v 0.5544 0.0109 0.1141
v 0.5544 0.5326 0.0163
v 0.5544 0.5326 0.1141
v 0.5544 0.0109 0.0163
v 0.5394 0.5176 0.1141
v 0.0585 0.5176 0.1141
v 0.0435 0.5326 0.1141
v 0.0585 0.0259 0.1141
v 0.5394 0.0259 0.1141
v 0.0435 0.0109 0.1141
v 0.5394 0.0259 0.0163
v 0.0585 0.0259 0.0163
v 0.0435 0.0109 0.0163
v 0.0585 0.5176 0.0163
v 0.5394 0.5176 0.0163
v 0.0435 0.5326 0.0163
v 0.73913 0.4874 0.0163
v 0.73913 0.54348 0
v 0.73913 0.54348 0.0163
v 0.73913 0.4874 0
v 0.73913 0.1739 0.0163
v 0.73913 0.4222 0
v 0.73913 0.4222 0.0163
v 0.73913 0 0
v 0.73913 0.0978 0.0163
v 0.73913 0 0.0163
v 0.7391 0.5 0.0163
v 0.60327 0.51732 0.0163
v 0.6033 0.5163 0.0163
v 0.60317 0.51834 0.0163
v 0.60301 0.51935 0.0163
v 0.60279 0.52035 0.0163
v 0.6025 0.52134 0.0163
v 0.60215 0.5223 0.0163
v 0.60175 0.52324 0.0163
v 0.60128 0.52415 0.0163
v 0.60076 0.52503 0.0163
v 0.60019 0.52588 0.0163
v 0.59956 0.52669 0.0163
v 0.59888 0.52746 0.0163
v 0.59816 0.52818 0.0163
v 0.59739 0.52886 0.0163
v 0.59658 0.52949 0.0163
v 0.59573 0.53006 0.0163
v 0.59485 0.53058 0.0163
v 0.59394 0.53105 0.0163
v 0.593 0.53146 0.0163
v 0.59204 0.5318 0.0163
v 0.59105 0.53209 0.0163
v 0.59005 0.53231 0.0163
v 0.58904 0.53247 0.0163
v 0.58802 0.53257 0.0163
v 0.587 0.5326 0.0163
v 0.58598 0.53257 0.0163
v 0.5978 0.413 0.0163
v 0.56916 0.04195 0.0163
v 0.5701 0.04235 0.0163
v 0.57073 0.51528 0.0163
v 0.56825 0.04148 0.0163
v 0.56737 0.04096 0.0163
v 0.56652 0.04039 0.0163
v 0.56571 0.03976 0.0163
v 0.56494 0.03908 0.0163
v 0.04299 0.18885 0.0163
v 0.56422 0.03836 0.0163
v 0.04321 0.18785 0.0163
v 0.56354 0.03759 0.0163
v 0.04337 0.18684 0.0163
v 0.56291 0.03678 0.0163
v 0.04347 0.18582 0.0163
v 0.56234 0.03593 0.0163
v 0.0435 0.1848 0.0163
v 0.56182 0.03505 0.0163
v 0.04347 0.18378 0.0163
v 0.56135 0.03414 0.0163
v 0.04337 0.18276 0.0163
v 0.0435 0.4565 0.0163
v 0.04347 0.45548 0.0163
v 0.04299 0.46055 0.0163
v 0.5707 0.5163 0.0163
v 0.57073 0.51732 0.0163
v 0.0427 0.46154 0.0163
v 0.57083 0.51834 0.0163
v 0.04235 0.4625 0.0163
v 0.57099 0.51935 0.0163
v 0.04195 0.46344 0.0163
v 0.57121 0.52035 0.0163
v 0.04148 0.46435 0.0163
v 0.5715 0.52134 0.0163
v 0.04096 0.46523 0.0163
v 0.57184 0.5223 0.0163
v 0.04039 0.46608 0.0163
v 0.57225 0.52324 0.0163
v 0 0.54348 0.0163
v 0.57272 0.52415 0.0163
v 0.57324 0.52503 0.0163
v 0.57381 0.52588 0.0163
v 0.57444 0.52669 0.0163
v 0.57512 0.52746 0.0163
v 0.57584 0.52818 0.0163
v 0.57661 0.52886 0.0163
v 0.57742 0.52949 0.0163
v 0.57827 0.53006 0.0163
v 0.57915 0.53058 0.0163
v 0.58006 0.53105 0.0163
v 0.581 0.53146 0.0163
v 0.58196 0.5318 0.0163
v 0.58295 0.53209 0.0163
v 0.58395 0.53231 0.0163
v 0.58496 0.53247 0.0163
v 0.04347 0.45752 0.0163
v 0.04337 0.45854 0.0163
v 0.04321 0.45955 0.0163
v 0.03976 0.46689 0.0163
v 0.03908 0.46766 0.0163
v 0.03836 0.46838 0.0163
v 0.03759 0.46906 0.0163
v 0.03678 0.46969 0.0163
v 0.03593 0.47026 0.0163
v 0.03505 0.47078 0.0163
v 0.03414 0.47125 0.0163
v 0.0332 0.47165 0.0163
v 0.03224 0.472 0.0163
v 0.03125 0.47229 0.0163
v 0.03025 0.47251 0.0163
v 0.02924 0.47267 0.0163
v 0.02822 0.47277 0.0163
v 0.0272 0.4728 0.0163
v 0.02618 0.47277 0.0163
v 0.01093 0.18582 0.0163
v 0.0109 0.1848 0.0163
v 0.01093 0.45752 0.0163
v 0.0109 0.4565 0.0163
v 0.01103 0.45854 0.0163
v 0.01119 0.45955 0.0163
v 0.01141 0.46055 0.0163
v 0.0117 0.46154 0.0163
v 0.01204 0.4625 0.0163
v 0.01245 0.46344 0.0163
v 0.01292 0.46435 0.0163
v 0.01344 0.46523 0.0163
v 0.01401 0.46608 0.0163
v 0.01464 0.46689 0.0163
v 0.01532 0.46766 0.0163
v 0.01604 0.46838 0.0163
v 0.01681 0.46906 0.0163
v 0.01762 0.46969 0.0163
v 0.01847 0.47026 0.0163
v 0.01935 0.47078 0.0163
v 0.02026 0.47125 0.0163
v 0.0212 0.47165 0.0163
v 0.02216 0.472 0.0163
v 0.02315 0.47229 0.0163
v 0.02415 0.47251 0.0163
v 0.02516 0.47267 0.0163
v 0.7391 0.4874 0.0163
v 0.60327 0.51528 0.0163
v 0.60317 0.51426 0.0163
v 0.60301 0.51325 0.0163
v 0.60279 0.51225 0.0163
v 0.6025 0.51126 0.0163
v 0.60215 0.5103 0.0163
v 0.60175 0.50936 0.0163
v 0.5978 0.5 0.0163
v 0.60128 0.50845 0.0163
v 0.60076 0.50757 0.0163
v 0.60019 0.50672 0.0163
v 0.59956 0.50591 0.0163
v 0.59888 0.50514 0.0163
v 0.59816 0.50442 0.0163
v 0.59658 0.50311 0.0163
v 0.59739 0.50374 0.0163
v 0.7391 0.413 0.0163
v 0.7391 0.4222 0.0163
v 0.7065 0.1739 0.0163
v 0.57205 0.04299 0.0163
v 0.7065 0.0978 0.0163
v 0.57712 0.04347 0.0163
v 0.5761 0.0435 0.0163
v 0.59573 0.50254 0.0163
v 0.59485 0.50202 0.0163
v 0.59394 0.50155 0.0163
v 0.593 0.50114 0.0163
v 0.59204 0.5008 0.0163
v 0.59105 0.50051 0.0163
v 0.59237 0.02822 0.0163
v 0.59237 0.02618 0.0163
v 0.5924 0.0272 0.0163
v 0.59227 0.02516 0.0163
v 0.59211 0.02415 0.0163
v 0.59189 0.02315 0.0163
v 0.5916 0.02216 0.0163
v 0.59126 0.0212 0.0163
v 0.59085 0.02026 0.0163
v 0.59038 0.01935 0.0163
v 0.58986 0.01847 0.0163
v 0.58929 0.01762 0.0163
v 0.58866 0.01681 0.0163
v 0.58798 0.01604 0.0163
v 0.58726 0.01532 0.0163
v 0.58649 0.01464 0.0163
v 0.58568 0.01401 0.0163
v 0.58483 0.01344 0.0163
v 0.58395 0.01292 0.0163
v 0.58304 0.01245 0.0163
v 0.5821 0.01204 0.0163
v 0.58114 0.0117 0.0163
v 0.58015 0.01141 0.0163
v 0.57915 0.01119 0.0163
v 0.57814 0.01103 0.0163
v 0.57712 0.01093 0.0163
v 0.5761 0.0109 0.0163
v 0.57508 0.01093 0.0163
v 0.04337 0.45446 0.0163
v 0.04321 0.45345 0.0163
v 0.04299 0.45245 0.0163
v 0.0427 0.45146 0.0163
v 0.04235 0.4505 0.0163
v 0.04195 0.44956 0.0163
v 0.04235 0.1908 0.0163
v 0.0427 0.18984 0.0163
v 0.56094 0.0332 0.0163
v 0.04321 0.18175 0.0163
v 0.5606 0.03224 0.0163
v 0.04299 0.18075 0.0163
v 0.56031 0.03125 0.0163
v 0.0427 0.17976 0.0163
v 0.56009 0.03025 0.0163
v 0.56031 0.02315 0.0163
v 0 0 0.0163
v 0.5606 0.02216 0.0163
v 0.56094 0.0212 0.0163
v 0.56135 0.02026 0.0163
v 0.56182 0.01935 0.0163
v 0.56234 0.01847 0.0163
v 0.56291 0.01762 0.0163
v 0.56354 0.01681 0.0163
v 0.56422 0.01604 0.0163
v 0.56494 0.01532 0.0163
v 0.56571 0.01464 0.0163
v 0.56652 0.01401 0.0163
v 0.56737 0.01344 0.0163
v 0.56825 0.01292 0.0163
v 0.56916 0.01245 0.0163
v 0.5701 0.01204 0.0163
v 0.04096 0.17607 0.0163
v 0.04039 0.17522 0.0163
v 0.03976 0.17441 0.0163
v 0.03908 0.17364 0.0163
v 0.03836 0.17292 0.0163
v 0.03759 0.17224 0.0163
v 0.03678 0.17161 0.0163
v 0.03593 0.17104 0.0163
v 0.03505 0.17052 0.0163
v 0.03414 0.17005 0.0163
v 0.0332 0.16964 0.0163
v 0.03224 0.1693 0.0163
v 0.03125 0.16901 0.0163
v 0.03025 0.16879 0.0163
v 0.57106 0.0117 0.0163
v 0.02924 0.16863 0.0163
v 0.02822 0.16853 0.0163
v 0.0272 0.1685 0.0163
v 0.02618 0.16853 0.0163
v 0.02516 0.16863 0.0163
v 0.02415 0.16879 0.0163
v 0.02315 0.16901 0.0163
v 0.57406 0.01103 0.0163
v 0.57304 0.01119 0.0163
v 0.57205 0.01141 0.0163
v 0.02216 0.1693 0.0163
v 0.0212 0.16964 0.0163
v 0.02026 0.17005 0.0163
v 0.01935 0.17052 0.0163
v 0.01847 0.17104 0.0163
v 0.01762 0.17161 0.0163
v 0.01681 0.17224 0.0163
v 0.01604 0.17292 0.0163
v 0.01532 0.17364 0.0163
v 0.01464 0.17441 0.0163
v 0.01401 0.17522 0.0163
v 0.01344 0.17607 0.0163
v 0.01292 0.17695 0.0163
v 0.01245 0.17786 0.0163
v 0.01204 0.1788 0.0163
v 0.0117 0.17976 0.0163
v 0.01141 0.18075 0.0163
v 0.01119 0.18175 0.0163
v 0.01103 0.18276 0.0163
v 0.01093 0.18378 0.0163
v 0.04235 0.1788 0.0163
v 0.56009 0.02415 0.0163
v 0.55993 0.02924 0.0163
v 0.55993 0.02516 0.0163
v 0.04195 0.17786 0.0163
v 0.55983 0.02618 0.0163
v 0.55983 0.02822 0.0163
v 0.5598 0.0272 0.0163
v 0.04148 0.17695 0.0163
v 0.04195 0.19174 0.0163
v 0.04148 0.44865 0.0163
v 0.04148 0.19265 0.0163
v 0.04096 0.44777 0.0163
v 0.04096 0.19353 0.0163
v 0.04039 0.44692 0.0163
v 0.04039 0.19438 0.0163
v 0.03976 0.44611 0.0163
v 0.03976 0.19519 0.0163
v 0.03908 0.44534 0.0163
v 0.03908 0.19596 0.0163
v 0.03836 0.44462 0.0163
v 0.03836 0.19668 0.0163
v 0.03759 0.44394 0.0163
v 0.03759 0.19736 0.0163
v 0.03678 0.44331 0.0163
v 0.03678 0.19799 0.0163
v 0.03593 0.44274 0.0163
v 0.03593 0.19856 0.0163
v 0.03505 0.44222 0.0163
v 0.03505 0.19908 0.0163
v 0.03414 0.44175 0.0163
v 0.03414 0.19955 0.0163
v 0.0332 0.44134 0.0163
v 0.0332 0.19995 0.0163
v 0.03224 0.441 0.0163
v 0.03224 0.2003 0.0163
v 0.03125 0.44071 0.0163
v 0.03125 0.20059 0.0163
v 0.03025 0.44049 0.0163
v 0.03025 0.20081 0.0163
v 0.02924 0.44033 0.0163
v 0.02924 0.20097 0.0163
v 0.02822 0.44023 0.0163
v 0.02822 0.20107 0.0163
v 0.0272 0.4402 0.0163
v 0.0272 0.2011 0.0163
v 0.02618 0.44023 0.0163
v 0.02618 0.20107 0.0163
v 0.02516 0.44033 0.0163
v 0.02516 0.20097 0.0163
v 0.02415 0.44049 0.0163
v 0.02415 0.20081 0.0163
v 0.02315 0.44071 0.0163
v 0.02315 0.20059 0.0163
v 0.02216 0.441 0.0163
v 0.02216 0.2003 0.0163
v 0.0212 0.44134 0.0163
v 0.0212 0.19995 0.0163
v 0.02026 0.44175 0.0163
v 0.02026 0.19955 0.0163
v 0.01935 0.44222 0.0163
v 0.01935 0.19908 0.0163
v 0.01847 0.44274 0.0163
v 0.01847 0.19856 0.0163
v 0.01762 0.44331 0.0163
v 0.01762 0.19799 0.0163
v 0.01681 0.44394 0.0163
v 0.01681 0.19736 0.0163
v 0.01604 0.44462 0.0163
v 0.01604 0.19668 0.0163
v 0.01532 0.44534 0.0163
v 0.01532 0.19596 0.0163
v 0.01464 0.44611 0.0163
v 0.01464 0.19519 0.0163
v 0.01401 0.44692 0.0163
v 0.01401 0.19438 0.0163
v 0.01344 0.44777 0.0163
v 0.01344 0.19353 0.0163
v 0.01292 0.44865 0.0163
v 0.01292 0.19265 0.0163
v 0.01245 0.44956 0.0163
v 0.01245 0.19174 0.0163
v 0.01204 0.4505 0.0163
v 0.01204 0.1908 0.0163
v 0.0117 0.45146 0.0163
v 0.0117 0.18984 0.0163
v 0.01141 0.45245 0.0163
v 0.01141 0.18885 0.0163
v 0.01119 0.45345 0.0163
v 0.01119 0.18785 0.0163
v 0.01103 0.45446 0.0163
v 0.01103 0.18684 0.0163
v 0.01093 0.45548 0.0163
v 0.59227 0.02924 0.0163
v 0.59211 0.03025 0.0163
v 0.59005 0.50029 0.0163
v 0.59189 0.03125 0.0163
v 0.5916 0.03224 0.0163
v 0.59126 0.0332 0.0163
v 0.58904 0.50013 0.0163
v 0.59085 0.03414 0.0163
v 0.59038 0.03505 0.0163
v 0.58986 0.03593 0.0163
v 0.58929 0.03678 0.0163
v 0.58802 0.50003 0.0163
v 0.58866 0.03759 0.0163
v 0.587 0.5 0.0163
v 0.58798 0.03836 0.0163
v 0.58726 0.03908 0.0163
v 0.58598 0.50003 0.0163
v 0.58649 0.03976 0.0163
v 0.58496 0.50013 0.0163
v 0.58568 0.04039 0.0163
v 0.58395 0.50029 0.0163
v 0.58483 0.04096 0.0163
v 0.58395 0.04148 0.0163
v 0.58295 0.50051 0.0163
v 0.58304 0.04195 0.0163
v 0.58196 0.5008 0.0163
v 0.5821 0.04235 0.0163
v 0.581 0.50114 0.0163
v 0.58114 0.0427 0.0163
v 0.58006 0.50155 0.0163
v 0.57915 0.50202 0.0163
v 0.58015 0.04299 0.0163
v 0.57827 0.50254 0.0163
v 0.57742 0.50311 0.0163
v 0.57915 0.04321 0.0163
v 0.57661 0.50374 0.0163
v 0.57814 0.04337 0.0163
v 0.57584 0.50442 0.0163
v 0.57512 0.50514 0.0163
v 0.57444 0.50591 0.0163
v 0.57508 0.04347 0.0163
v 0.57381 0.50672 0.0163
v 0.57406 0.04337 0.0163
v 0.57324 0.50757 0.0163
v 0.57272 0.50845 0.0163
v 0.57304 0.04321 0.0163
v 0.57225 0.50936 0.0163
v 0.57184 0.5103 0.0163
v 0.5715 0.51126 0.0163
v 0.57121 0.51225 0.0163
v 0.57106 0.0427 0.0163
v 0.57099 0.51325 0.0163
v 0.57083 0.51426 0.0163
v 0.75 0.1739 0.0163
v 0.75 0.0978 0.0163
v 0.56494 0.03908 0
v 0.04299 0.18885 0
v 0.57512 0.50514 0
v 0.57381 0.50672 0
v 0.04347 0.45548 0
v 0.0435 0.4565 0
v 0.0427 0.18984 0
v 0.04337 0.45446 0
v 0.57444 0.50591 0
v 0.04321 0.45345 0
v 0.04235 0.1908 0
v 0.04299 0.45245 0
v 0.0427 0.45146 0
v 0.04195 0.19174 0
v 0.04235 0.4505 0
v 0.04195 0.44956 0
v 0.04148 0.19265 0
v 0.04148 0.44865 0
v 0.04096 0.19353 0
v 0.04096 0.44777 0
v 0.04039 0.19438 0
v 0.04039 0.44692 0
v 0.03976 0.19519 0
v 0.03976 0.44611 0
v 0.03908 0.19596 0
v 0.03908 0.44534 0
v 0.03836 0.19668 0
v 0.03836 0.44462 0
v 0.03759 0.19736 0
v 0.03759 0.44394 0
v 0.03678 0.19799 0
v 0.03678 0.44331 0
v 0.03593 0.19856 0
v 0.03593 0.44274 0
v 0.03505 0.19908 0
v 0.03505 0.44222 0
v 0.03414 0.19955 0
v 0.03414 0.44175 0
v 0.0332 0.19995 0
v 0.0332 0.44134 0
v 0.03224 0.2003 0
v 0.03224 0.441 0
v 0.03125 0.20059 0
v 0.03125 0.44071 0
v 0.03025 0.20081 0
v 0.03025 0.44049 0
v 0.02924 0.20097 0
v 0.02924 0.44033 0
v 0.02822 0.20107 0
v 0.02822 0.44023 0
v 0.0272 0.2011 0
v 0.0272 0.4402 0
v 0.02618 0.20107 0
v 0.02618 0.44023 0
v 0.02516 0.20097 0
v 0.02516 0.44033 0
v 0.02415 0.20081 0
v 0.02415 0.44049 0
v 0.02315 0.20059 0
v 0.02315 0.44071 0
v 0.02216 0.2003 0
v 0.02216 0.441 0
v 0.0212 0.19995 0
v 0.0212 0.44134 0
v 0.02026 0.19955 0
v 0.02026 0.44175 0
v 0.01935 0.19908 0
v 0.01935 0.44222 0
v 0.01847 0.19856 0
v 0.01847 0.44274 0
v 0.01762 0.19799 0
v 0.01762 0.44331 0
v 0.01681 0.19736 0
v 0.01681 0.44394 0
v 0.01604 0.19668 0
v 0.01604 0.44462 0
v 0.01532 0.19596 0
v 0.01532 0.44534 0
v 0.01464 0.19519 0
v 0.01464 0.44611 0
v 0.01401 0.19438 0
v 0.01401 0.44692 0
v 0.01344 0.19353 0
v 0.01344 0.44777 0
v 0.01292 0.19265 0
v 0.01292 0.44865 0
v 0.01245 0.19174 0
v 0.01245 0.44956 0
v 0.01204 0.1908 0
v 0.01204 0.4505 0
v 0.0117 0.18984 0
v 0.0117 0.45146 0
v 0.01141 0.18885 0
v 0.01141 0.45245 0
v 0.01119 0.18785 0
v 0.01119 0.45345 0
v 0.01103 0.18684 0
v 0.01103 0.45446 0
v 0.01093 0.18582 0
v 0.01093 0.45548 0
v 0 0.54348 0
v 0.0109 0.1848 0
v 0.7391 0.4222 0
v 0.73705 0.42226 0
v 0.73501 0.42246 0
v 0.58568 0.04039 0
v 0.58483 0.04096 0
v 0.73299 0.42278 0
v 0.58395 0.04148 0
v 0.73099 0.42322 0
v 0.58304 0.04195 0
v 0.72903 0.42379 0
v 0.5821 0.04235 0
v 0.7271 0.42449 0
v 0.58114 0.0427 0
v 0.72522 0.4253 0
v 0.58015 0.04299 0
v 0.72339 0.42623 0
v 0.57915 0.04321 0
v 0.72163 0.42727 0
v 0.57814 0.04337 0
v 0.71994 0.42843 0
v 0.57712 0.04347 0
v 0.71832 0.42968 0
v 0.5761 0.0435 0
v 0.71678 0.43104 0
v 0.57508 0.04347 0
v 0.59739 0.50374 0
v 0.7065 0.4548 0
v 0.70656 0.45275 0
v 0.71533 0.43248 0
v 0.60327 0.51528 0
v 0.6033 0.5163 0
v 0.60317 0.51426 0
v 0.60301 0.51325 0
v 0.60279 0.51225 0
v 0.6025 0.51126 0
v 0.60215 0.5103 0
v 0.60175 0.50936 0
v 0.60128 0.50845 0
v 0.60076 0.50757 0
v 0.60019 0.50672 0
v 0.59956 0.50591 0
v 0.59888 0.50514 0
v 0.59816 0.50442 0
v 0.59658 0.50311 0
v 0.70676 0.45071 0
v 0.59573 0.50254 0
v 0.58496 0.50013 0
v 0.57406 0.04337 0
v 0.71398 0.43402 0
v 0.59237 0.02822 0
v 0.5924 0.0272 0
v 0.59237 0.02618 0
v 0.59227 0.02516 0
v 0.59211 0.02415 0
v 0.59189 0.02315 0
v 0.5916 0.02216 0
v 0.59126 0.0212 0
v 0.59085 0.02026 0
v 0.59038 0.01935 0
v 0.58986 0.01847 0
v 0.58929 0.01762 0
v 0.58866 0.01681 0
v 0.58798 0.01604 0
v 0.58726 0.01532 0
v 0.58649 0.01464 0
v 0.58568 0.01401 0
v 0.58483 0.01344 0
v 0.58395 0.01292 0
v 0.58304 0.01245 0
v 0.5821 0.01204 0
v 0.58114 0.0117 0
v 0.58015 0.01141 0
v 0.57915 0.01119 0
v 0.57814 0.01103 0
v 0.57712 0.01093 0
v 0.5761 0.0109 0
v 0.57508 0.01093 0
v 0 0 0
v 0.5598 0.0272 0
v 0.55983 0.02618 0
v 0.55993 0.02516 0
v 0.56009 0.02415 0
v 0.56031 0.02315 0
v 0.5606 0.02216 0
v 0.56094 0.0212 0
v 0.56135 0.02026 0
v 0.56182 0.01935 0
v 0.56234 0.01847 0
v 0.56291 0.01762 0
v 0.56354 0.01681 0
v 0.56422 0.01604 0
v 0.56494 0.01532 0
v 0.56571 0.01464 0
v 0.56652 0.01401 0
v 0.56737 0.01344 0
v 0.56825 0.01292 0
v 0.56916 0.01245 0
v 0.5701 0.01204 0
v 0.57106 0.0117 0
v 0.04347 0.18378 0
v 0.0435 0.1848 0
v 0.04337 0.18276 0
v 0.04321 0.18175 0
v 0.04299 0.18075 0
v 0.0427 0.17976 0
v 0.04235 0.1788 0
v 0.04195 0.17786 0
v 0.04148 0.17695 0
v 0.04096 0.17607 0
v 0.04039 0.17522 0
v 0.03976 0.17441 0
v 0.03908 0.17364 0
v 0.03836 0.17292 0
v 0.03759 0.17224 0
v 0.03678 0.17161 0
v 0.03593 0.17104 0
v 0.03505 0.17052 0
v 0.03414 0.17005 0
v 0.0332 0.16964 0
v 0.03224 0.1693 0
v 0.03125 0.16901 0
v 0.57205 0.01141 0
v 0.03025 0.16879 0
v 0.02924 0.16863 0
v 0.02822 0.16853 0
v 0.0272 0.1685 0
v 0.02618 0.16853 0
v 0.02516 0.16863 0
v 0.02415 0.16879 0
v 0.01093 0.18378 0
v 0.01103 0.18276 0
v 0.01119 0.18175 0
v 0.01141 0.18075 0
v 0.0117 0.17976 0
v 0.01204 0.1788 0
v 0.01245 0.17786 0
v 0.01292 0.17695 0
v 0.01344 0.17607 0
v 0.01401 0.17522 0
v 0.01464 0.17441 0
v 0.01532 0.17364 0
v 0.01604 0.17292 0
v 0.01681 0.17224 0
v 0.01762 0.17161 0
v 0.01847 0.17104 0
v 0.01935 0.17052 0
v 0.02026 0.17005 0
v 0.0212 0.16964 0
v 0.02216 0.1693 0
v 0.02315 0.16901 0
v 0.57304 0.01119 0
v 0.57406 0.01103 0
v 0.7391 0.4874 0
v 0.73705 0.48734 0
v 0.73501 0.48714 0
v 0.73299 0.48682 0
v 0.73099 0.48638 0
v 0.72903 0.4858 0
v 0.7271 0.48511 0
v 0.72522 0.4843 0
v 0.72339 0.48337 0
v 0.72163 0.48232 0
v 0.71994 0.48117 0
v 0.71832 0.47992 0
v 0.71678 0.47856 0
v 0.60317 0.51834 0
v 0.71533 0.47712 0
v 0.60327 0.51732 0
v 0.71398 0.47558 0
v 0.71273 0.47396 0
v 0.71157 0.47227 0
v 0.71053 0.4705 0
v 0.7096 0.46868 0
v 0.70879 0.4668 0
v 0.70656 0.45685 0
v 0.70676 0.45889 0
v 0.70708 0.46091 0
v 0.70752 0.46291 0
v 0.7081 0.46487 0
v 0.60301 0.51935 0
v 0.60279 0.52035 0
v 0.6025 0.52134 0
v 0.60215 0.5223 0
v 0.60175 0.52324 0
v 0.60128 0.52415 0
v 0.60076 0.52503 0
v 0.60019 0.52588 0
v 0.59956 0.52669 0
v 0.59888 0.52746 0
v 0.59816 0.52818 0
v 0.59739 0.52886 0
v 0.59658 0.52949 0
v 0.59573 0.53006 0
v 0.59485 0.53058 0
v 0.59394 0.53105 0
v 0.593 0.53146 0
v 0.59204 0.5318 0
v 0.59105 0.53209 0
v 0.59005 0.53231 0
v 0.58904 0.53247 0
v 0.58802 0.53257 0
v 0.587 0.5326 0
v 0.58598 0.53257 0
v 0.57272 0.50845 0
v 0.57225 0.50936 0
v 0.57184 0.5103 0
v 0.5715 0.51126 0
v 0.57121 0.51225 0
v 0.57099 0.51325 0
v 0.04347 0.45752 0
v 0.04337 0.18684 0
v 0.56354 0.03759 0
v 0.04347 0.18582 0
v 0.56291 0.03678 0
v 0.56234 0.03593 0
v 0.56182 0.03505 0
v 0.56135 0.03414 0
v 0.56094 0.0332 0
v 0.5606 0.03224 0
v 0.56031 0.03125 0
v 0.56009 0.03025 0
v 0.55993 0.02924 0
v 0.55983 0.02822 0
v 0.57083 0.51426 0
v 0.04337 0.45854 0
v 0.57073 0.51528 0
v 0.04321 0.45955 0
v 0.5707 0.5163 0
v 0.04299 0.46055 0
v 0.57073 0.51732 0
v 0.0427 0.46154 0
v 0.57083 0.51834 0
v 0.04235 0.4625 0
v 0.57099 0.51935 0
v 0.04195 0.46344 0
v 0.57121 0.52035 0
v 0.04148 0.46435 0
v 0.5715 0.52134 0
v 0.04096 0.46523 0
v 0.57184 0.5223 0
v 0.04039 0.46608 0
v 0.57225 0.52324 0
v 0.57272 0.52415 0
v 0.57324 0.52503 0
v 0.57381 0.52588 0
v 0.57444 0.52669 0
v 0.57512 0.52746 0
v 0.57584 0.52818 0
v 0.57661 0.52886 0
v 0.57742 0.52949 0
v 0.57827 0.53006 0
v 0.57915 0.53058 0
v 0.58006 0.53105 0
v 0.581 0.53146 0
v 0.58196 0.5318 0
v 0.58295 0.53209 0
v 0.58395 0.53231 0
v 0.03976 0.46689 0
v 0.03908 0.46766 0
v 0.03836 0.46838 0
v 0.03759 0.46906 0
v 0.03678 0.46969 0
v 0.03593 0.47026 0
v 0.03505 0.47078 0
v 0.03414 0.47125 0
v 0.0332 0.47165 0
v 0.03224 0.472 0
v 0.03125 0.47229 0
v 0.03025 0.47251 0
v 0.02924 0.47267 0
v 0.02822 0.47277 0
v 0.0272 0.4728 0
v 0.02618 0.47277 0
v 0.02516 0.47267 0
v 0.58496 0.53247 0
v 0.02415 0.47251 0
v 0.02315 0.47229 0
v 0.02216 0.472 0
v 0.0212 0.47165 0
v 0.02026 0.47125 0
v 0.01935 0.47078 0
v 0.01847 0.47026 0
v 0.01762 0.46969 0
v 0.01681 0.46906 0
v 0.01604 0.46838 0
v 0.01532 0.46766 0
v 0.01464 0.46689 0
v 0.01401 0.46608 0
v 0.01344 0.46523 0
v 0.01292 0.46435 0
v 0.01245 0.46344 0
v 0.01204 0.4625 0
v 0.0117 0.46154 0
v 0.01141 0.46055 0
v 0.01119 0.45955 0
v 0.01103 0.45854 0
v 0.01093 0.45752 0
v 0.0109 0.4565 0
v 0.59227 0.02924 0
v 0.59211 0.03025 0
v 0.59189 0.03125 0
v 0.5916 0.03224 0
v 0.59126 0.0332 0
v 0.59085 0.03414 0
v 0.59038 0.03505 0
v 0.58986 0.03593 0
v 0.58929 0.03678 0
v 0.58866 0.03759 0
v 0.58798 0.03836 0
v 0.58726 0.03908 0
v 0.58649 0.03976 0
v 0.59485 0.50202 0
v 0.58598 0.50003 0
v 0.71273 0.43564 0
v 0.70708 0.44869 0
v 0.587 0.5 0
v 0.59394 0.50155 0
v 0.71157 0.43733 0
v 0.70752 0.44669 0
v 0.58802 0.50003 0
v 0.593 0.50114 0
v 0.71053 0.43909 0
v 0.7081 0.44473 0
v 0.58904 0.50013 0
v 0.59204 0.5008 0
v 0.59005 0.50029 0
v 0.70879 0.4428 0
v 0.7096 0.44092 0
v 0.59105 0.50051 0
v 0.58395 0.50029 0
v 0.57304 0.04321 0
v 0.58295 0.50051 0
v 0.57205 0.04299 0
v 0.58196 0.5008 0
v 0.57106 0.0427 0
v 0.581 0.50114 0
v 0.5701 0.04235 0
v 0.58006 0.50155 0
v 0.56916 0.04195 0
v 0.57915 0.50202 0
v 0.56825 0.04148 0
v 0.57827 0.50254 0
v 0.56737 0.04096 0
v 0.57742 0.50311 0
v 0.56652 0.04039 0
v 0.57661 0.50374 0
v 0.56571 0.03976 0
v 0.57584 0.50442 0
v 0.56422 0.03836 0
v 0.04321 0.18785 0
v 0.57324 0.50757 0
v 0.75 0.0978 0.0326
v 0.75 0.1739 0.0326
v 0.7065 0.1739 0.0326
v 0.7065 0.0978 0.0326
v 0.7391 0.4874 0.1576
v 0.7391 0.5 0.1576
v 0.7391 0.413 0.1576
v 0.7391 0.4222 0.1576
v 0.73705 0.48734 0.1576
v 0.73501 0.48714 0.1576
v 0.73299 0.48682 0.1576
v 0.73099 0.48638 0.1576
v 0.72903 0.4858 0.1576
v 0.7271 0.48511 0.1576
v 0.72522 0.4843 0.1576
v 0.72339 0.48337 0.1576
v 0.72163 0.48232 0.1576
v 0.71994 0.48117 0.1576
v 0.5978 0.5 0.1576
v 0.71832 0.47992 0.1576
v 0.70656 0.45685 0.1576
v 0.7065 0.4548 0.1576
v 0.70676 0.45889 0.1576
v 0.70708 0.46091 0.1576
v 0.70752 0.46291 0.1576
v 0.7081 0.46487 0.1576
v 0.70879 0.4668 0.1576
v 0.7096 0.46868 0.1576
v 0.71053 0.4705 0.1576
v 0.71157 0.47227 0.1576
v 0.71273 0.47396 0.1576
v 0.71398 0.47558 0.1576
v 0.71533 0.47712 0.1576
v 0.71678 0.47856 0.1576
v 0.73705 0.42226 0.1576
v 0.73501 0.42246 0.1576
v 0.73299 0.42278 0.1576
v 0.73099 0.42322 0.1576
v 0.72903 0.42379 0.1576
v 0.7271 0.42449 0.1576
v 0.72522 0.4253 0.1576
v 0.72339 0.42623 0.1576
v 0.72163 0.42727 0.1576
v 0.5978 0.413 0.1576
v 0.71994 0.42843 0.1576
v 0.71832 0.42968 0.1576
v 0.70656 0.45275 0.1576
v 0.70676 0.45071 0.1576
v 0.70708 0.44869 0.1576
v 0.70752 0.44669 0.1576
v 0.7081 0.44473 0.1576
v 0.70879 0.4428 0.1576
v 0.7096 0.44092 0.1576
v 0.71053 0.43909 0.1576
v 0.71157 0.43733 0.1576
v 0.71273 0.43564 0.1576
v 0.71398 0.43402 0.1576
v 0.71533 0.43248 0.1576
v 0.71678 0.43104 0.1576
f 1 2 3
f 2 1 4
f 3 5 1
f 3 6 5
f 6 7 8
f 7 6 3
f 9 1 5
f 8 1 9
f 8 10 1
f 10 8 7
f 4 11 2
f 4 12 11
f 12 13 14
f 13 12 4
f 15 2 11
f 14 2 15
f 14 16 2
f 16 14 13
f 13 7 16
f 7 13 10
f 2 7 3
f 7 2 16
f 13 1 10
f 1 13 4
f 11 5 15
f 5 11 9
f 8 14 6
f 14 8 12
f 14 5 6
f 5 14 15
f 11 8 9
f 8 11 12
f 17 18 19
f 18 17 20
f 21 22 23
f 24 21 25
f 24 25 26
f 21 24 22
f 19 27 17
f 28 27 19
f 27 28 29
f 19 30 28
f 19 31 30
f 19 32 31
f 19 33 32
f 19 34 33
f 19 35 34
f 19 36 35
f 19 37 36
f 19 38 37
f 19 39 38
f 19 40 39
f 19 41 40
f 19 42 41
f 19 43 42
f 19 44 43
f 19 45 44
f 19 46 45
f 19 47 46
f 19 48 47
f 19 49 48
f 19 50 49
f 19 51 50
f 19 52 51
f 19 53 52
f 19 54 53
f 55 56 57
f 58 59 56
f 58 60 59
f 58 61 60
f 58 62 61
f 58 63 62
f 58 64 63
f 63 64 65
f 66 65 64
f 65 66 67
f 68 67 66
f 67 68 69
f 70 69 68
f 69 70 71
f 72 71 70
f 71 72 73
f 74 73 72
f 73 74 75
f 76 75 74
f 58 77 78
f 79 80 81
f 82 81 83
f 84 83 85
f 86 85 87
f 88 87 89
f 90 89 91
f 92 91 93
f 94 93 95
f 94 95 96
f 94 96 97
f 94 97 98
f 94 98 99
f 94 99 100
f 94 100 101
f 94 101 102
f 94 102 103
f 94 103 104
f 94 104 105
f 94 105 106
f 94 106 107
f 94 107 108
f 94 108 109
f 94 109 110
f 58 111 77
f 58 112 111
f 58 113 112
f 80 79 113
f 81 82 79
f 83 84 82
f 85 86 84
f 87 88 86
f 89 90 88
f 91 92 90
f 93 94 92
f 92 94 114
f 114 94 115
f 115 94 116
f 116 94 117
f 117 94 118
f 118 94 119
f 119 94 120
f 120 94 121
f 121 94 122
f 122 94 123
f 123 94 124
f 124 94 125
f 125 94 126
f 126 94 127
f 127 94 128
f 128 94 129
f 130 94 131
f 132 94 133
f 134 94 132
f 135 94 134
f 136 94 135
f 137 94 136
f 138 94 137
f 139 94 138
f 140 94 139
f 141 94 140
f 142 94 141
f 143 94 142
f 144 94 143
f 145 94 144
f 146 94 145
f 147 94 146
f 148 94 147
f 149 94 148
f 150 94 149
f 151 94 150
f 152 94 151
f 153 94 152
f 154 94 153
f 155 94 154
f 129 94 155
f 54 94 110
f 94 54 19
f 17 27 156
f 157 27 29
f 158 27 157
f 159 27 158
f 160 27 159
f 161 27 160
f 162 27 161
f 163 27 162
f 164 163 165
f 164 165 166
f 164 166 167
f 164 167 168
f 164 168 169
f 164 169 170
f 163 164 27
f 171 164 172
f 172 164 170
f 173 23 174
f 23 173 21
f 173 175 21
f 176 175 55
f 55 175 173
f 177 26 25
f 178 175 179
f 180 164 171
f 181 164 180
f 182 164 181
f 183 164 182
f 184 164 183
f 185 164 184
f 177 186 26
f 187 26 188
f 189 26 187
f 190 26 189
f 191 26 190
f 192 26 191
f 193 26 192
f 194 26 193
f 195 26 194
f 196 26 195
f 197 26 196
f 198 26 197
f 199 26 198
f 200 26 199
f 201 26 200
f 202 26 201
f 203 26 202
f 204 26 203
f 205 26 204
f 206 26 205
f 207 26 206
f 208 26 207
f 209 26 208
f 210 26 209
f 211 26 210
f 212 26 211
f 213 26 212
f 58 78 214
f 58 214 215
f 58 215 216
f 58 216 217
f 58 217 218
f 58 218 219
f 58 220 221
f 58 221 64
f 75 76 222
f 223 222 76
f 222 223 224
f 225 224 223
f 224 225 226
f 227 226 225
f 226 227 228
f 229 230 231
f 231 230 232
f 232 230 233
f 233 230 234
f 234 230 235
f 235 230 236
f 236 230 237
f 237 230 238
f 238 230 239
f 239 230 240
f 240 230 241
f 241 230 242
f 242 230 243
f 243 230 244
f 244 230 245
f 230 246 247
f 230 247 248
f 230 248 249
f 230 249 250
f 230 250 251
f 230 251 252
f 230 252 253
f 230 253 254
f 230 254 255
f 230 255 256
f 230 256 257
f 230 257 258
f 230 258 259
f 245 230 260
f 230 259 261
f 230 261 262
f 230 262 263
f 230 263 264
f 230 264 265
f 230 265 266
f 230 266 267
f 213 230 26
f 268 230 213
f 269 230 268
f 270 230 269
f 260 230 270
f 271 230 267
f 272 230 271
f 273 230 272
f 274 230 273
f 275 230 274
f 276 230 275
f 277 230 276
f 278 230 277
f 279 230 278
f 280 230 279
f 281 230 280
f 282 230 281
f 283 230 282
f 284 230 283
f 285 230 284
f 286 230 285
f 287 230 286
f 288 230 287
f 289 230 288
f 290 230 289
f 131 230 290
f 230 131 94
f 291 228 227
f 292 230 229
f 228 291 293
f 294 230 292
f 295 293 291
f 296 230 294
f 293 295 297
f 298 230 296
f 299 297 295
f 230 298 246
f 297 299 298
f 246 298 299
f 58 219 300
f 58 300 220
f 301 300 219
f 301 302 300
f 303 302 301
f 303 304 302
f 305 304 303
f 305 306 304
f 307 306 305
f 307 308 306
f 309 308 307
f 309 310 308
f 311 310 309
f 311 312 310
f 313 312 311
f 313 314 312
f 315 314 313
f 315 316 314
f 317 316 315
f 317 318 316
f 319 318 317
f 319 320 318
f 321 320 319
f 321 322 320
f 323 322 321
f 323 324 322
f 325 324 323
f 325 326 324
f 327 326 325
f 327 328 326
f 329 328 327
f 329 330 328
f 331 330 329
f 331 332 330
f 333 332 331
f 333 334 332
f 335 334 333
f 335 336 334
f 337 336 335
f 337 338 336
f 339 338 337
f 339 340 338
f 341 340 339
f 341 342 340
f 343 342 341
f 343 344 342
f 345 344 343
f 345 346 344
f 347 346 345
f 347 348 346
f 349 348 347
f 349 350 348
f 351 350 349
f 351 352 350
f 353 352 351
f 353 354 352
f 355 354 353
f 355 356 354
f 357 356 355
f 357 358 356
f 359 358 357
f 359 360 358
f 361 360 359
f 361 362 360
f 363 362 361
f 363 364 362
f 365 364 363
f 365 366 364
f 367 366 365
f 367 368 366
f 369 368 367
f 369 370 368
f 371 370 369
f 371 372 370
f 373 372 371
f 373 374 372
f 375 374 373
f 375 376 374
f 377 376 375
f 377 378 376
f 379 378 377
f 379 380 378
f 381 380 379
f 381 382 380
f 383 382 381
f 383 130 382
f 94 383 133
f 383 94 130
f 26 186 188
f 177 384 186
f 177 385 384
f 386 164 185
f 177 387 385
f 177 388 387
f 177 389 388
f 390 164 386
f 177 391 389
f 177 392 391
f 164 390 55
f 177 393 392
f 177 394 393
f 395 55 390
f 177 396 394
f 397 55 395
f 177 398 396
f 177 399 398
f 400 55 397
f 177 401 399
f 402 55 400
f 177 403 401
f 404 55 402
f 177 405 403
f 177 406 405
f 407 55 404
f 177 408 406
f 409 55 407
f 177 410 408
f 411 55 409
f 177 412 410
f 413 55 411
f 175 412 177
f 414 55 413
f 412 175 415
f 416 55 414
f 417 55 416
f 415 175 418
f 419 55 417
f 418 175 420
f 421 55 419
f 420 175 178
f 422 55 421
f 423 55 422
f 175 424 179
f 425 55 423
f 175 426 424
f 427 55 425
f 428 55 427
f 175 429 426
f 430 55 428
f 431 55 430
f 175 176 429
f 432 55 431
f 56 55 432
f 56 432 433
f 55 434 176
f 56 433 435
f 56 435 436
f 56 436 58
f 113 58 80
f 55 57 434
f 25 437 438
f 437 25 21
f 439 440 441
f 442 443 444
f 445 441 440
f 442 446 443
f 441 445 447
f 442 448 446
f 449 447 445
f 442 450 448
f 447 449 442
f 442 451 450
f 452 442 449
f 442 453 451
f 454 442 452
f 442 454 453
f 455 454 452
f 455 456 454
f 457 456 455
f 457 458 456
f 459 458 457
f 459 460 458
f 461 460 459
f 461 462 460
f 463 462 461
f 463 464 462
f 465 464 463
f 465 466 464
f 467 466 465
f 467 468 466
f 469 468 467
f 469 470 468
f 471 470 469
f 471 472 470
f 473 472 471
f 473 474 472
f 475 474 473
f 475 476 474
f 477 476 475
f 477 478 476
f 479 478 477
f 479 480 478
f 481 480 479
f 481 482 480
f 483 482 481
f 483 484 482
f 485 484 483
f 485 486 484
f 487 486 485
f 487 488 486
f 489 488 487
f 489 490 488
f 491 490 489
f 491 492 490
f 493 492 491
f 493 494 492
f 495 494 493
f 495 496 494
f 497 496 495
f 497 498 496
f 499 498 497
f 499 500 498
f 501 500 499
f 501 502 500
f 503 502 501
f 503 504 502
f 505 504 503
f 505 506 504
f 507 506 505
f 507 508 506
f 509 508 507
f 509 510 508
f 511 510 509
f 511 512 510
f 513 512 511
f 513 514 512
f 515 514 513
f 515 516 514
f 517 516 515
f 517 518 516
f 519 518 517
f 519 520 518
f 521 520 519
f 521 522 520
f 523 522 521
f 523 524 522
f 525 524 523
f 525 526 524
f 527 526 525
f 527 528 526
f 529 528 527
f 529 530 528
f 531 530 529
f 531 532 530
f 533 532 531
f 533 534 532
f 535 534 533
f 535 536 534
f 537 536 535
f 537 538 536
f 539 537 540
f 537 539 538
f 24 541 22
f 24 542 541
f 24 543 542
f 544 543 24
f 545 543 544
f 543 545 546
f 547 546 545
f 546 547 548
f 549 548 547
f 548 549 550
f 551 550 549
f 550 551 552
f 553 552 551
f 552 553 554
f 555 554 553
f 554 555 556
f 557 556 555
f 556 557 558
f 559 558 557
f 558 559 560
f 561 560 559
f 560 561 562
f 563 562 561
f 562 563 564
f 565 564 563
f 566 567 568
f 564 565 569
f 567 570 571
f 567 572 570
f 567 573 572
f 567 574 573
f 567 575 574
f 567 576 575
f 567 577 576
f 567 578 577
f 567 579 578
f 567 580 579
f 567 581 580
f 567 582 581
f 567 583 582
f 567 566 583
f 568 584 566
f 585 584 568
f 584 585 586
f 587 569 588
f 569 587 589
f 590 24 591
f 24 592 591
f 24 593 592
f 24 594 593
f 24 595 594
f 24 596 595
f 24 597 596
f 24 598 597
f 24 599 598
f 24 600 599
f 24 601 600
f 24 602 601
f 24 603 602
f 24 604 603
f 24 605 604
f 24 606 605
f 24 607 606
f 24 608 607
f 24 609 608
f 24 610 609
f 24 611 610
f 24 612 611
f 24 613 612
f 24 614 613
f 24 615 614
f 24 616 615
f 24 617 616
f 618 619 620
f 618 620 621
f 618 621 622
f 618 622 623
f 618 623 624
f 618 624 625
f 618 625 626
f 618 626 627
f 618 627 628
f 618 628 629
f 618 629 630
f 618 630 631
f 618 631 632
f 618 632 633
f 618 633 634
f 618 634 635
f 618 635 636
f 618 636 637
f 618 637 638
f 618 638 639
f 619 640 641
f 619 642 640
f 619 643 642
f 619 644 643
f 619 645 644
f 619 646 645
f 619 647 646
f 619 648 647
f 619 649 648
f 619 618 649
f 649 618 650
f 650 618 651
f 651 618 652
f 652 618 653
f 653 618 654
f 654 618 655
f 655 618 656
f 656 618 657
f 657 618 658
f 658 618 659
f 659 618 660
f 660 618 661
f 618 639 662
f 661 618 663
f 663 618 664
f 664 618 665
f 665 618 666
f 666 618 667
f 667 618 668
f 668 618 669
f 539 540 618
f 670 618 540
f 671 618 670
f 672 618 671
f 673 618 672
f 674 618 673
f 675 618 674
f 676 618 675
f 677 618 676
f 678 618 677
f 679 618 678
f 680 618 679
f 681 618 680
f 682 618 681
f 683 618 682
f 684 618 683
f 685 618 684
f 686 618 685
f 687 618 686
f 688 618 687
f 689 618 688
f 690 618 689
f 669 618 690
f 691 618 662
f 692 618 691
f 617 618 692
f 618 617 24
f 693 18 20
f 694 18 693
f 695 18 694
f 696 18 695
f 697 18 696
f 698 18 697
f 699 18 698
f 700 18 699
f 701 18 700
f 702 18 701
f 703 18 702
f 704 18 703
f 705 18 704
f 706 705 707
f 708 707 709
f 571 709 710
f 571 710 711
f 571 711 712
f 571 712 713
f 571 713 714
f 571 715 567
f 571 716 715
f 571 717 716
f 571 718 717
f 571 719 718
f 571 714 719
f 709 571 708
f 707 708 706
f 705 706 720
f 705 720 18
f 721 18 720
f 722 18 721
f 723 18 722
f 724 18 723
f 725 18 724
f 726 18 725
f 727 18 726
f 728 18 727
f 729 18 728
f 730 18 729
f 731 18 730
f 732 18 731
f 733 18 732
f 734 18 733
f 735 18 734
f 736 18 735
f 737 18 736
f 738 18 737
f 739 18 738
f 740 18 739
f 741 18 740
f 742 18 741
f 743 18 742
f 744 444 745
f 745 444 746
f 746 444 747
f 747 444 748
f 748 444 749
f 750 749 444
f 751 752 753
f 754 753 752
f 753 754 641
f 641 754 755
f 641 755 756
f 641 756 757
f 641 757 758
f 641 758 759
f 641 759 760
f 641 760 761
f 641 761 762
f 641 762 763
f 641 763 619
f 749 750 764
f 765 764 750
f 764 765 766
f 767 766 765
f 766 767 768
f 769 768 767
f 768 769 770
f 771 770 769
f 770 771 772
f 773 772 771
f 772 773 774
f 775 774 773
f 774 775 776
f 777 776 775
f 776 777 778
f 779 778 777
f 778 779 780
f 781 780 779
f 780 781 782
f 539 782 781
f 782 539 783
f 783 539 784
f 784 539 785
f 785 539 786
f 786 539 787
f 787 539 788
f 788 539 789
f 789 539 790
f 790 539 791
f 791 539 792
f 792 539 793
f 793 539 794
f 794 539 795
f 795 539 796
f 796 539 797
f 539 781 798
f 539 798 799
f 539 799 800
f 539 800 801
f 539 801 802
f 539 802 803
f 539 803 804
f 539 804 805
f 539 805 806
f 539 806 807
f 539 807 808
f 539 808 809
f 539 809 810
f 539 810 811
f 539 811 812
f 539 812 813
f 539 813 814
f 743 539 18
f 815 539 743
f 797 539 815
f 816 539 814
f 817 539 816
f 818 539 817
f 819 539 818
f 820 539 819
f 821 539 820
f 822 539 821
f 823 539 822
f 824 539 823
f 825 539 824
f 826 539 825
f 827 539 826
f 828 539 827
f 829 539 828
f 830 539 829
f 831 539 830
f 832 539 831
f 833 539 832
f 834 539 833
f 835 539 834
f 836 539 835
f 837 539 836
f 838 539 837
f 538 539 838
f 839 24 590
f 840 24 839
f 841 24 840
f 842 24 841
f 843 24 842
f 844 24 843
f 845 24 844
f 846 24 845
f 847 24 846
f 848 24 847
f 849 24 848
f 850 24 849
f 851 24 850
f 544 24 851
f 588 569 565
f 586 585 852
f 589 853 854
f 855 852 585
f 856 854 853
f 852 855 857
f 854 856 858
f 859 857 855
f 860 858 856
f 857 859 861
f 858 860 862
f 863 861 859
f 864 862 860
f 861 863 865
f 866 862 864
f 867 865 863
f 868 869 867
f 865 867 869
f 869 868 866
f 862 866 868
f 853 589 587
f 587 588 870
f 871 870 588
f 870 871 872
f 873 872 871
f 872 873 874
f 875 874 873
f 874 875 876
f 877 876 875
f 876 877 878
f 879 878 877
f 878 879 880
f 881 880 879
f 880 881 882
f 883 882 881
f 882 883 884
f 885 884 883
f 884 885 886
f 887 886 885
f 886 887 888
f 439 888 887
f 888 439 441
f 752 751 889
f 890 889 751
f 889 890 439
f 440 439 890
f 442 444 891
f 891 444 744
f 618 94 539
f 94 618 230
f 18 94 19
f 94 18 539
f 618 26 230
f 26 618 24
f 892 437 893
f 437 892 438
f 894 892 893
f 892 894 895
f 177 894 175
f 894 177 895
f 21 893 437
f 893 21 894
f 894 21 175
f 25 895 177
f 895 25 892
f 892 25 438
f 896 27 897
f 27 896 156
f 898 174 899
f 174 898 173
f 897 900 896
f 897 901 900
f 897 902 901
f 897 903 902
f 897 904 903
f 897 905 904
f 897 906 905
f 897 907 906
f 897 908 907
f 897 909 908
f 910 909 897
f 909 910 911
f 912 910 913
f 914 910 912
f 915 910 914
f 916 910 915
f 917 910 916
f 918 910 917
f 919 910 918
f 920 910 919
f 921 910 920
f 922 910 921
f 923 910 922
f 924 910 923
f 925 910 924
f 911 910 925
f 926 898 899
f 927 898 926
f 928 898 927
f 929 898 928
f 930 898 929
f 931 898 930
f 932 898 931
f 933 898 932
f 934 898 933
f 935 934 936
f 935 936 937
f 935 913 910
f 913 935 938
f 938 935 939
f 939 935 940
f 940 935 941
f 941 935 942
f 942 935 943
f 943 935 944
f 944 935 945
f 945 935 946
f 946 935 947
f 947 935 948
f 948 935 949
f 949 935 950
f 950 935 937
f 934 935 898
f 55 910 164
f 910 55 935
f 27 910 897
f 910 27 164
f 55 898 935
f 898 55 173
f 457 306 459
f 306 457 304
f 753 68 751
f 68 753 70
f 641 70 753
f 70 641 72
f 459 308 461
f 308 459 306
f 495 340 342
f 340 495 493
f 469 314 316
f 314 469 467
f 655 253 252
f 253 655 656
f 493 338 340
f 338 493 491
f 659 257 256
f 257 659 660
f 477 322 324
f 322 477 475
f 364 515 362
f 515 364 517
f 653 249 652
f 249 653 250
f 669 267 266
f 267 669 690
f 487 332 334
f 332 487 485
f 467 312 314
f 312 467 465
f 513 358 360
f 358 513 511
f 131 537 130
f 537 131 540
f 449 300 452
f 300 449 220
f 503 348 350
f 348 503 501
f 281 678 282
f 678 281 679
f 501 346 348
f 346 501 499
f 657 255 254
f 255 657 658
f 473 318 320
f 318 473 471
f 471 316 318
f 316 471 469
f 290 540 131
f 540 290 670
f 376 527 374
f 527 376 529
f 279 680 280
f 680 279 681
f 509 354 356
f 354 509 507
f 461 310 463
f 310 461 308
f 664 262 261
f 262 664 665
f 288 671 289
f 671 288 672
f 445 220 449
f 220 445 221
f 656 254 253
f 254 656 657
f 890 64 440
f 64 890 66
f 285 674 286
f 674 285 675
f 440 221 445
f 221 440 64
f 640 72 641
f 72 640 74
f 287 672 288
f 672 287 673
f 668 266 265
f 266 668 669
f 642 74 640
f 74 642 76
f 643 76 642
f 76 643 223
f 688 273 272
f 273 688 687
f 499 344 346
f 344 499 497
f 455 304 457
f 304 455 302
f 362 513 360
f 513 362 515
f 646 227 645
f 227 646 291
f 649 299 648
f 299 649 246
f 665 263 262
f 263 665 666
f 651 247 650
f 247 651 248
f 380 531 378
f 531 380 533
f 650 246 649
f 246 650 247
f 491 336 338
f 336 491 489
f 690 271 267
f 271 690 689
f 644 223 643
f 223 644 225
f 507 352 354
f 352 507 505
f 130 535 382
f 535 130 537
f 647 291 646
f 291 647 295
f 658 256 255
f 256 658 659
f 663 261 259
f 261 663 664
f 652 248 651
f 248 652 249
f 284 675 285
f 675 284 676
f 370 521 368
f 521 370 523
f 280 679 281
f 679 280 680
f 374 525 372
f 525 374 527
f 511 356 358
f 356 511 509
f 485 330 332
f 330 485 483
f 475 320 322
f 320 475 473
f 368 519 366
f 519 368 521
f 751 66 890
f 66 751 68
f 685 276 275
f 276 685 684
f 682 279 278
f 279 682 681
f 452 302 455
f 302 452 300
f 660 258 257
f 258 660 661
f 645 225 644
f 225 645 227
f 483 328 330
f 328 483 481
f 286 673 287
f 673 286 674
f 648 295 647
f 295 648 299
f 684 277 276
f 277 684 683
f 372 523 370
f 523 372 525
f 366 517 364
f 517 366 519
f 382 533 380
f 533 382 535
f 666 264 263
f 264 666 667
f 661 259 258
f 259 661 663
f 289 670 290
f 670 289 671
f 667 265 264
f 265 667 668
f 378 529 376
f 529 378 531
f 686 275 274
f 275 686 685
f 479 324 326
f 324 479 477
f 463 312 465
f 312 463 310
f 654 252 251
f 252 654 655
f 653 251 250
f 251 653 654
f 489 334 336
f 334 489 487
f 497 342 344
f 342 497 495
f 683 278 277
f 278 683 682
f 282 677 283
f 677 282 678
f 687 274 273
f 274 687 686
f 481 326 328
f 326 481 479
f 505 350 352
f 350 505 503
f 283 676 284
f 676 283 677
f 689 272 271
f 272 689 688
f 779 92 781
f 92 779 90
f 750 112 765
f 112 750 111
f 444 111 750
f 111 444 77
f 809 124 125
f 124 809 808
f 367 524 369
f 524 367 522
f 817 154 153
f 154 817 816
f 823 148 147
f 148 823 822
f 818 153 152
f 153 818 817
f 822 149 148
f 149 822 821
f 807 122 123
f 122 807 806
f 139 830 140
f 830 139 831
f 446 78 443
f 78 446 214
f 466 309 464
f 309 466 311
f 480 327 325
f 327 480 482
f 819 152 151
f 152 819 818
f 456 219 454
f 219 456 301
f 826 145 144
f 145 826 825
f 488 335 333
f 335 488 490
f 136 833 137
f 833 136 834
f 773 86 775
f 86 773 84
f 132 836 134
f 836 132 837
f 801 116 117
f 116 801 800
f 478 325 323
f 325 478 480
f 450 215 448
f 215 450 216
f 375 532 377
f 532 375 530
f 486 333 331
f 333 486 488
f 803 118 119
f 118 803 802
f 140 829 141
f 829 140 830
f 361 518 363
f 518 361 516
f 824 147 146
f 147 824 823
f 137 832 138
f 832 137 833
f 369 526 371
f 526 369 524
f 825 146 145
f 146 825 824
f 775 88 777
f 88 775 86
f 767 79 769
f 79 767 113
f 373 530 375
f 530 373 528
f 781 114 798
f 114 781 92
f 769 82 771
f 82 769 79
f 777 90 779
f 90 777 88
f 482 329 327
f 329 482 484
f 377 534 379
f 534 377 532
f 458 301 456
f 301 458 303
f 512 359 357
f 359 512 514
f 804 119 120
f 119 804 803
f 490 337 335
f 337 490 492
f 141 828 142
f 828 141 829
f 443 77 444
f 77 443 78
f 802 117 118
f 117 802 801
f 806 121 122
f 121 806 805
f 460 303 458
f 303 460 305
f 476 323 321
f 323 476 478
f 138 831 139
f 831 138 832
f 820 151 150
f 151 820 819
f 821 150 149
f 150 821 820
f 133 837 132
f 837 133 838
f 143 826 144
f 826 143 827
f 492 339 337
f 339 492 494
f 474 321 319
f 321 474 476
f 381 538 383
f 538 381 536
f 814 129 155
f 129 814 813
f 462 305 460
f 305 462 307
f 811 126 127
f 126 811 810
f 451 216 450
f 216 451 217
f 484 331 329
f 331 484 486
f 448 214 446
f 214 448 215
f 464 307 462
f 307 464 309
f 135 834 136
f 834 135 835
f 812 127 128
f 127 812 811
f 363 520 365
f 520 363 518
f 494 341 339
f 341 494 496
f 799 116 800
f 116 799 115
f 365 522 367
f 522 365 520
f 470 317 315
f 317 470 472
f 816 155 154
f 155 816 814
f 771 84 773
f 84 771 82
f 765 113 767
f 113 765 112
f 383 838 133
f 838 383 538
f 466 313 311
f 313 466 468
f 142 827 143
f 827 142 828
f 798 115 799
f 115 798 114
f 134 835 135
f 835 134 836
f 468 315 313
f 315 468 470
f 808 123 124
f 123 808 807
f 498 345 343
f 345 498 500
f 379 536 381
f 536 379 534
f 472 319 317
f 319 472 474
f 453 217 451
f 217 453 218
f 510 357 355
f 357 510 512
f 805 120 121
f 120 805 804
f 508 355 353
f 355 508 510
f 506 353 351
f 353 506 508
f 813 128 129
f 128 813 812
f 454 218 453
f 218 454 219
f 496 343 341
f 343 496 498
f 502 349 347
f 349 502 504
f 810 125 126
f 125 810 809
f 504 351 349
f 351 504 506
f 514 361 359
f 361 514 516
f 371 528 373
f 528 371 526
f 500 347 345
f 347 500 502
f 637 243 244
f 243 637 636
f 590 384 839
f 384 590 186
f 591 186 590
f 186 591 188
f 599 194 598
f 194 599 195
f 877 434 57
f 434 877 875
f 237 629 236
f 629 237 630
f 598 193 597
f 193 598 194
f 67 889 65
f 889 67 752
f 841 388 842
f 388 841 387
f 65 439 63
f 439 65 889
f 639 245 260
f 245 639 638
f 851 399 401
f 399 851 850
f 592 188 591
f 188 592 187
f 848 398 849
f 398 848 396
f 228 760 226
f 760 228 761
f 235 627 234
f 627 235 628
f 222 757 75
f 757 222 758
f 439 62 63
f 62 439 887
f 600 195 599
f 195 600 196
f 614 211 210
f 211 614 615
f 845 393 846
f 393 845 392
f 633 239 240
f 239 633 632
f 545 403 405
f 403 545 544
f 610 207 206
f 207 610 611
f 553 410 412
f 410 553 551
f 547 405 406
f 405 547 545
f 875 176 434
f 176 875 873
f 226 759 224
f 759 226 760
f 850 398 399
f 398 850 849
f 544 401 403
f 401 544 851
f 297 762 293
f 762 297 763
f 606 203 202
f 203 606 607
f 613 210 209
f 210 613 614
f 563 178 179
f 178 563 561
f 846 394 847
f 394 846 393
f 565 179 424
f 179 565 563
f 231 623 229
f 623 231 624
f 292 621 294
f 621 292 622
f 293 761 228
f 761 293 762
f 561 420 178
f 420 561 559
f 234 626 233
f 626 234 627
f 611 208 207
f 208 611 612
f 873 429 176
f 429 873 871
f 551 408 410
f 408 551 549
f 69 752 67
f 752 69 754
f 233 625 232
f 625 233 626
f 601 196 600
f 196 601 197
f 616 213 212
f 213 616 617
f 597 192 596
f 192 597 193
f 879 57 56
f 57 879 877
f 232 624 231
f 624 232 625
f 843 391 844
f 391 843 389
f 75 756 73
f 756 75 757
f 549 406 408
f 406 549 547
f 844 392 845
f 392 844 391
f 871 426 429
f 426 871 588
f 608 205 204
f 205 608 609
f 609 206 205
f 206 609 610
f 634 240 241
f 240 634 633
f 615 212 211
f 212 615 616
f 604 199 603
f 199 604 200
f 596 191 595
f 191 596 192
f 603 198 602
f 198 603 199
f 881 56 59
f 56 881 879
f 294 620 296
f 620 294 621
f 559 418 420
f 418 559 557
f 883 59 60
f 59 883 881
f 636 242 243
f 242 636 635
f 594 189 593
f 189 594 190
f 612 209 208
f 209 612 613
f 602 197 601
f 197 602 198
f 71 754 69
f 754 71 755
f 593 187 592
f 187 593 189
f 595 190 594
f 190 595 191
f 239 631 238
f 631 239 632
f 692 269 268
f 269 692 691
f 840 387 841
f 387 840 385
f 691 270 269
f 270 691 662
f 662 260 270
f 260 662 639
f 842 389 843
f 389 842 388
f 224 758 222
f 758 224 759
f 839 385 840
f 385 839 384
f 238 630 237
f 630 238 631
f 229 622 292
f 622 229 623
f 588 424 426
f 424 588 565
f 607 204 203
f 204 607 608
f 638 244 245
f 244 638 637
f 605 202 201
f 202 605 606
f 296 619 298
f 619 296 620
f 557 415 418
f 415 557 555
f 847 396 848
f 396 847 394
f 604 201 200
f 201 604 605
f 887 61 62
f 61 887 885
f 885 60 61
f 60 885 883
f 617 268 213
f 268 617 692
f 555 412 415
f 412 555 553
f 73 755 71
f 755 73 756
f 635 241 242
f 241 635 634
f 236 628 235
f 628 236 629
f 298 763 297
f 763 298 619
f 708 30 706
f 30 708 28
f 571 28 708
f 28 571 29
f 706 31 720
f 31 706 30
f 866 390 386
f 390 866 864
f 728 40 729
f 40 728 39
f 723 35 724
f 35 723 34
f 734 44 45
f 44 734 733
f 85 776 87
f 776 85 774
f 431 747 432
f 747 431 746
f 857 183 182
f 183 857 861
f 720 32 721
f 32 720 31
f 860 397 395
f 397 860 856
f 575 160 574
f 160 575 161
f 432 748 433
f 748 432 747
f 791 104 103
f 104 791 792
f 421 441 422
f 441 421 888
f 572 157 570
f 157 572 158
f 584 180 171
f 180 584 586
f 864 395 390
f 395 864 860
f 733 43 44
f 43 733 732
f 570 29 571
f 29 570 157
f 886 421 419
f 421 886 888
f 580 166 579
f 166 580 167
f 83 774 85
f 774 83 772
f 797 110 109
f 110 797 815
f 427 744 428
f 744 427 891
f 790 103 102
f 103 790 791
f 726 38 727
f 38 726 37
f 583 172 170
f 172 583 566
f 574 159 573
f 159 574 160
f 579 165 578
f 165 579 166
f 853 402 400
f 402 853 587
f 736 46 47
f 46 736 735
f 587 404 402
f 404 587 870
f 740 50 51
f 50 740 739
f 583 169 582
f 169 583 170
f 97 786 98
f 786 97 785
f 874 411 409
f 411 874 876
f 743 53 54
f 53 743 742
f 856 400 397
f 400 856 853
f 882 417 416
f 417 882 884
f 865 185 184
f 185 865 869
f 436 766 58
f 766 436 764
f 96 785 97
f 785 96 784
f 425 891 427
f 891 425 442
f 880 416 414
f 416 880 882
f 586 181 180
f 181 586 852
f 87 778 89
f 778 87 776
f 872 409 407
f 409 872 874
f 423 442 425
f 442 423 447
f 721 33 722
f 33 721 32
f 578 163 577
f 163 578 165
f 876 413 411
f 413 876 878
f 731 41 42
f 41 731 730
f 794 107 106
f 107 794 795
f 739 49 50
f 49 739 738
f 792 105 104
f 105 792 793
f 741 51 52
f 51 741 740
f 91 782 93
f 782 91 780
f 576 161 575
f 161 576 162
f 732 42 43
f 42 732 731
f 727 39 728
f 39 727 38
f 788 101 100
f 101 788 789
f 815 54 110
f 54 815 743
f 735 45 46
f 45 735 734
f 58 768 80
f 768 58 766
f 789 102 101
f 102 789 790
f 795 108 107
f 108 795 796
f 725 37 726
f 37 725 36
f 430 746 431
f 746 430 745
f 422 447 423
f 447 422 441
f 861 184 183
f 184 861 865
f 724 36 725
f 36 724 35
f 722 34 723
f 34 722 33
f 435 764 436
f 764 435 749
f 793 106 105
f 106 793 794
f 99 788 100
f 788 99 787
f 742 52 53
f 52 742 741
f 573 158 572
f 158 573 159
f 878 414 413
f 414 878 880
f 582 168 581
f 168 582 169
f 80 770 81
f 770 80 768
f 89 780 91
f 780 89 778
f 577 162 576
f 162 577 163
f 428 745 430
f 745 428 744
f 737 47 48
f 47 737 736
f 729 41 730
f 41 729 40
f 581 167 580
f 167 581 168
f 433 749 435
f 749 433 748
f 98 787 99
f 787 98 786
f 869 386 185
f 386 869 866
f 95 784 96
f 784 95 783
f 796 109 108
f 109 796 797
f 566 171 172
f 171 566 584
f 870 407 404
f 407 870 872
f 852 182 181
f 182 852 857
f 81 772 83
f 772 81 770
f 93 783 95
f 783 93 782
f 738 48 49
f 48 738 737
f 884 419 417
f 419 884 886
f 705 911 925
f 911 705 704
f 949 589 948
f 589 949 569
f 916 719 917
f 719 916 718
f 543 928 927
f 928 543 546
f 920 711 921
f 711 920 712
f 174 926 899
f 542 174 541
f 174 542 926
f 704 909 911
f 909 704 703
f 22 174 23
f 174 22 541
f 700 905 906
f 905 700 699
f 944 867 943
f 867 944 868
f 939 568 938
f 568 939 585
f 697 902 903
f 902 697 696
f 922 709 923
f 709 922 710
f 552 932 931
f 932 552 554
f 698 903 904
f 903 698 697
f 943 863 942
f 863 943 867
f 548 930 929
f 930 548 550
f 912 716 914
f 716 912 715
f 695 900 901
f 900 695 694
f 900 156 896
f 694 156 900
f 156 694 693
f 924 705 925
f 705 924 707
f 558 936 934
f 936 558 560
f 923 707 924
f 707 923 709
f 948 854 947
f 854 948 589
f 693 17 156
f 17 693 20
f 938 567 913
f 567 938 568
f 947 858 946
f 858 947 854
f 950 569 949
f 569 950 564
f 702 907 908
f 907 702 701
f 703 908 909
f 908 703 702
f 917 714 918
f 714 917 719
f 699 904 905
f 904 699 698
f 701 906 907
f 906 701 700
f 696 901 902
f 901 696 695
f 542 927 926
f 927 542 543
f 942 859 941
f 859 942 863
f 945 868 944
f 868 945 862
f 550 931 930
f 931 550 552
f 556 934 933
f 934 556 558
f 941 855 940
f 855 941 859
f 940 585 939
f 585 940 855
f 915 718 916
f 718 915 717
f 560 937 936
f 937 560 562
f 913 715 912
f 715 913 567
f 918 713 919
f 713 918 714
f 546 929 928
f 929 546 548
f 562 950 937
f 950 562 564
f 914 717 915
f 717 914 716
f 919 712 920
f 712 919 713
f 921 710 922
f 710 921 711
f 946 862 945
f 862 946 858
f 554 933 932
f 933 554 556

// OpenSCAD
// Global resolution
$fn = 100;

// Base parameters
base_len = 0.73913;
base_wid = 0.543478;
base_ht = 0.016304;

// Base hole parameters
hole_r = 0.0163;
hole_pos = [
    [0.0272, 0.1848],
    [0.0272, 0.4565],
    [0.5761, 0.0272],
    [0.5870, 0.5163]
];

// Rail parameters
rail_span_x = 0.5109;
rail_span_y = 0.5217;
rail_off_x = 0.0435;
rail_off_y = 0.0109;
rail_ht = 0.0978;
rail_wall = 0.015; // Wall thickness for rib outline

// Tab parameters
tab_len = 0.0435;
tab_wid = 0.0761;
tab_ht = 0.0163;
tab_off_x = 0.7065;
tab_off_y = 0.0978;

// Deep block parameters
blk_len = 0.1413;   // Derived from footprint to match right-edge constraint
blk_wid = 0.087;    // Derived from footprint
blk_ht = 0.1413;
blk_off_x = 0.5978;
blk_off_y = 0.413;

// Deep block hole parameters
blk_hole_r = 0.0326;
blk_hole_x = 0.7391;
blk_hole_y = 0.4548;

// Main geometry assembly
difference() {
    union() {
        // Base plate
        cube([base_len, base_wid, base_ht]);

        // Raised rail outline (hollow rectangular frame)
        translate([rail_off_x, rail_off_y, base_ht]) {
            difference() {
                cube([rail_span_x, rail_span_y, rail_ht]);
                translate([rail_wall, rail_wall, -0.5])
                    cube([rail_span_x - 2*rail_wall, rail_span_y - 2*rail_wall, rail_ht + 1]);
            }
        }

        // Shallow tab
        translate([tab_off_x, tab_off_y, base_ht])
            cube([tab_len, tab_wid, tab_ht]);

        // Deeper side block
        translate([blk_off_x, blk_off_y, base_ht])
            cube([blk_len, blk_wid, blk_ht]);
    }

    // Through holes in base plate
    for (p = hole_pos) {
        translate([p[0], p[1], -1])
            cylinder(r=hole_r, h=base_ht + 2);
    }

    // Through hole in deeper side block
    translate([blk_hole_x, blk_hole_y, base_ht - 1])
        cylinder(r=blk_hole_r, h=blk_ht + 2);
}
